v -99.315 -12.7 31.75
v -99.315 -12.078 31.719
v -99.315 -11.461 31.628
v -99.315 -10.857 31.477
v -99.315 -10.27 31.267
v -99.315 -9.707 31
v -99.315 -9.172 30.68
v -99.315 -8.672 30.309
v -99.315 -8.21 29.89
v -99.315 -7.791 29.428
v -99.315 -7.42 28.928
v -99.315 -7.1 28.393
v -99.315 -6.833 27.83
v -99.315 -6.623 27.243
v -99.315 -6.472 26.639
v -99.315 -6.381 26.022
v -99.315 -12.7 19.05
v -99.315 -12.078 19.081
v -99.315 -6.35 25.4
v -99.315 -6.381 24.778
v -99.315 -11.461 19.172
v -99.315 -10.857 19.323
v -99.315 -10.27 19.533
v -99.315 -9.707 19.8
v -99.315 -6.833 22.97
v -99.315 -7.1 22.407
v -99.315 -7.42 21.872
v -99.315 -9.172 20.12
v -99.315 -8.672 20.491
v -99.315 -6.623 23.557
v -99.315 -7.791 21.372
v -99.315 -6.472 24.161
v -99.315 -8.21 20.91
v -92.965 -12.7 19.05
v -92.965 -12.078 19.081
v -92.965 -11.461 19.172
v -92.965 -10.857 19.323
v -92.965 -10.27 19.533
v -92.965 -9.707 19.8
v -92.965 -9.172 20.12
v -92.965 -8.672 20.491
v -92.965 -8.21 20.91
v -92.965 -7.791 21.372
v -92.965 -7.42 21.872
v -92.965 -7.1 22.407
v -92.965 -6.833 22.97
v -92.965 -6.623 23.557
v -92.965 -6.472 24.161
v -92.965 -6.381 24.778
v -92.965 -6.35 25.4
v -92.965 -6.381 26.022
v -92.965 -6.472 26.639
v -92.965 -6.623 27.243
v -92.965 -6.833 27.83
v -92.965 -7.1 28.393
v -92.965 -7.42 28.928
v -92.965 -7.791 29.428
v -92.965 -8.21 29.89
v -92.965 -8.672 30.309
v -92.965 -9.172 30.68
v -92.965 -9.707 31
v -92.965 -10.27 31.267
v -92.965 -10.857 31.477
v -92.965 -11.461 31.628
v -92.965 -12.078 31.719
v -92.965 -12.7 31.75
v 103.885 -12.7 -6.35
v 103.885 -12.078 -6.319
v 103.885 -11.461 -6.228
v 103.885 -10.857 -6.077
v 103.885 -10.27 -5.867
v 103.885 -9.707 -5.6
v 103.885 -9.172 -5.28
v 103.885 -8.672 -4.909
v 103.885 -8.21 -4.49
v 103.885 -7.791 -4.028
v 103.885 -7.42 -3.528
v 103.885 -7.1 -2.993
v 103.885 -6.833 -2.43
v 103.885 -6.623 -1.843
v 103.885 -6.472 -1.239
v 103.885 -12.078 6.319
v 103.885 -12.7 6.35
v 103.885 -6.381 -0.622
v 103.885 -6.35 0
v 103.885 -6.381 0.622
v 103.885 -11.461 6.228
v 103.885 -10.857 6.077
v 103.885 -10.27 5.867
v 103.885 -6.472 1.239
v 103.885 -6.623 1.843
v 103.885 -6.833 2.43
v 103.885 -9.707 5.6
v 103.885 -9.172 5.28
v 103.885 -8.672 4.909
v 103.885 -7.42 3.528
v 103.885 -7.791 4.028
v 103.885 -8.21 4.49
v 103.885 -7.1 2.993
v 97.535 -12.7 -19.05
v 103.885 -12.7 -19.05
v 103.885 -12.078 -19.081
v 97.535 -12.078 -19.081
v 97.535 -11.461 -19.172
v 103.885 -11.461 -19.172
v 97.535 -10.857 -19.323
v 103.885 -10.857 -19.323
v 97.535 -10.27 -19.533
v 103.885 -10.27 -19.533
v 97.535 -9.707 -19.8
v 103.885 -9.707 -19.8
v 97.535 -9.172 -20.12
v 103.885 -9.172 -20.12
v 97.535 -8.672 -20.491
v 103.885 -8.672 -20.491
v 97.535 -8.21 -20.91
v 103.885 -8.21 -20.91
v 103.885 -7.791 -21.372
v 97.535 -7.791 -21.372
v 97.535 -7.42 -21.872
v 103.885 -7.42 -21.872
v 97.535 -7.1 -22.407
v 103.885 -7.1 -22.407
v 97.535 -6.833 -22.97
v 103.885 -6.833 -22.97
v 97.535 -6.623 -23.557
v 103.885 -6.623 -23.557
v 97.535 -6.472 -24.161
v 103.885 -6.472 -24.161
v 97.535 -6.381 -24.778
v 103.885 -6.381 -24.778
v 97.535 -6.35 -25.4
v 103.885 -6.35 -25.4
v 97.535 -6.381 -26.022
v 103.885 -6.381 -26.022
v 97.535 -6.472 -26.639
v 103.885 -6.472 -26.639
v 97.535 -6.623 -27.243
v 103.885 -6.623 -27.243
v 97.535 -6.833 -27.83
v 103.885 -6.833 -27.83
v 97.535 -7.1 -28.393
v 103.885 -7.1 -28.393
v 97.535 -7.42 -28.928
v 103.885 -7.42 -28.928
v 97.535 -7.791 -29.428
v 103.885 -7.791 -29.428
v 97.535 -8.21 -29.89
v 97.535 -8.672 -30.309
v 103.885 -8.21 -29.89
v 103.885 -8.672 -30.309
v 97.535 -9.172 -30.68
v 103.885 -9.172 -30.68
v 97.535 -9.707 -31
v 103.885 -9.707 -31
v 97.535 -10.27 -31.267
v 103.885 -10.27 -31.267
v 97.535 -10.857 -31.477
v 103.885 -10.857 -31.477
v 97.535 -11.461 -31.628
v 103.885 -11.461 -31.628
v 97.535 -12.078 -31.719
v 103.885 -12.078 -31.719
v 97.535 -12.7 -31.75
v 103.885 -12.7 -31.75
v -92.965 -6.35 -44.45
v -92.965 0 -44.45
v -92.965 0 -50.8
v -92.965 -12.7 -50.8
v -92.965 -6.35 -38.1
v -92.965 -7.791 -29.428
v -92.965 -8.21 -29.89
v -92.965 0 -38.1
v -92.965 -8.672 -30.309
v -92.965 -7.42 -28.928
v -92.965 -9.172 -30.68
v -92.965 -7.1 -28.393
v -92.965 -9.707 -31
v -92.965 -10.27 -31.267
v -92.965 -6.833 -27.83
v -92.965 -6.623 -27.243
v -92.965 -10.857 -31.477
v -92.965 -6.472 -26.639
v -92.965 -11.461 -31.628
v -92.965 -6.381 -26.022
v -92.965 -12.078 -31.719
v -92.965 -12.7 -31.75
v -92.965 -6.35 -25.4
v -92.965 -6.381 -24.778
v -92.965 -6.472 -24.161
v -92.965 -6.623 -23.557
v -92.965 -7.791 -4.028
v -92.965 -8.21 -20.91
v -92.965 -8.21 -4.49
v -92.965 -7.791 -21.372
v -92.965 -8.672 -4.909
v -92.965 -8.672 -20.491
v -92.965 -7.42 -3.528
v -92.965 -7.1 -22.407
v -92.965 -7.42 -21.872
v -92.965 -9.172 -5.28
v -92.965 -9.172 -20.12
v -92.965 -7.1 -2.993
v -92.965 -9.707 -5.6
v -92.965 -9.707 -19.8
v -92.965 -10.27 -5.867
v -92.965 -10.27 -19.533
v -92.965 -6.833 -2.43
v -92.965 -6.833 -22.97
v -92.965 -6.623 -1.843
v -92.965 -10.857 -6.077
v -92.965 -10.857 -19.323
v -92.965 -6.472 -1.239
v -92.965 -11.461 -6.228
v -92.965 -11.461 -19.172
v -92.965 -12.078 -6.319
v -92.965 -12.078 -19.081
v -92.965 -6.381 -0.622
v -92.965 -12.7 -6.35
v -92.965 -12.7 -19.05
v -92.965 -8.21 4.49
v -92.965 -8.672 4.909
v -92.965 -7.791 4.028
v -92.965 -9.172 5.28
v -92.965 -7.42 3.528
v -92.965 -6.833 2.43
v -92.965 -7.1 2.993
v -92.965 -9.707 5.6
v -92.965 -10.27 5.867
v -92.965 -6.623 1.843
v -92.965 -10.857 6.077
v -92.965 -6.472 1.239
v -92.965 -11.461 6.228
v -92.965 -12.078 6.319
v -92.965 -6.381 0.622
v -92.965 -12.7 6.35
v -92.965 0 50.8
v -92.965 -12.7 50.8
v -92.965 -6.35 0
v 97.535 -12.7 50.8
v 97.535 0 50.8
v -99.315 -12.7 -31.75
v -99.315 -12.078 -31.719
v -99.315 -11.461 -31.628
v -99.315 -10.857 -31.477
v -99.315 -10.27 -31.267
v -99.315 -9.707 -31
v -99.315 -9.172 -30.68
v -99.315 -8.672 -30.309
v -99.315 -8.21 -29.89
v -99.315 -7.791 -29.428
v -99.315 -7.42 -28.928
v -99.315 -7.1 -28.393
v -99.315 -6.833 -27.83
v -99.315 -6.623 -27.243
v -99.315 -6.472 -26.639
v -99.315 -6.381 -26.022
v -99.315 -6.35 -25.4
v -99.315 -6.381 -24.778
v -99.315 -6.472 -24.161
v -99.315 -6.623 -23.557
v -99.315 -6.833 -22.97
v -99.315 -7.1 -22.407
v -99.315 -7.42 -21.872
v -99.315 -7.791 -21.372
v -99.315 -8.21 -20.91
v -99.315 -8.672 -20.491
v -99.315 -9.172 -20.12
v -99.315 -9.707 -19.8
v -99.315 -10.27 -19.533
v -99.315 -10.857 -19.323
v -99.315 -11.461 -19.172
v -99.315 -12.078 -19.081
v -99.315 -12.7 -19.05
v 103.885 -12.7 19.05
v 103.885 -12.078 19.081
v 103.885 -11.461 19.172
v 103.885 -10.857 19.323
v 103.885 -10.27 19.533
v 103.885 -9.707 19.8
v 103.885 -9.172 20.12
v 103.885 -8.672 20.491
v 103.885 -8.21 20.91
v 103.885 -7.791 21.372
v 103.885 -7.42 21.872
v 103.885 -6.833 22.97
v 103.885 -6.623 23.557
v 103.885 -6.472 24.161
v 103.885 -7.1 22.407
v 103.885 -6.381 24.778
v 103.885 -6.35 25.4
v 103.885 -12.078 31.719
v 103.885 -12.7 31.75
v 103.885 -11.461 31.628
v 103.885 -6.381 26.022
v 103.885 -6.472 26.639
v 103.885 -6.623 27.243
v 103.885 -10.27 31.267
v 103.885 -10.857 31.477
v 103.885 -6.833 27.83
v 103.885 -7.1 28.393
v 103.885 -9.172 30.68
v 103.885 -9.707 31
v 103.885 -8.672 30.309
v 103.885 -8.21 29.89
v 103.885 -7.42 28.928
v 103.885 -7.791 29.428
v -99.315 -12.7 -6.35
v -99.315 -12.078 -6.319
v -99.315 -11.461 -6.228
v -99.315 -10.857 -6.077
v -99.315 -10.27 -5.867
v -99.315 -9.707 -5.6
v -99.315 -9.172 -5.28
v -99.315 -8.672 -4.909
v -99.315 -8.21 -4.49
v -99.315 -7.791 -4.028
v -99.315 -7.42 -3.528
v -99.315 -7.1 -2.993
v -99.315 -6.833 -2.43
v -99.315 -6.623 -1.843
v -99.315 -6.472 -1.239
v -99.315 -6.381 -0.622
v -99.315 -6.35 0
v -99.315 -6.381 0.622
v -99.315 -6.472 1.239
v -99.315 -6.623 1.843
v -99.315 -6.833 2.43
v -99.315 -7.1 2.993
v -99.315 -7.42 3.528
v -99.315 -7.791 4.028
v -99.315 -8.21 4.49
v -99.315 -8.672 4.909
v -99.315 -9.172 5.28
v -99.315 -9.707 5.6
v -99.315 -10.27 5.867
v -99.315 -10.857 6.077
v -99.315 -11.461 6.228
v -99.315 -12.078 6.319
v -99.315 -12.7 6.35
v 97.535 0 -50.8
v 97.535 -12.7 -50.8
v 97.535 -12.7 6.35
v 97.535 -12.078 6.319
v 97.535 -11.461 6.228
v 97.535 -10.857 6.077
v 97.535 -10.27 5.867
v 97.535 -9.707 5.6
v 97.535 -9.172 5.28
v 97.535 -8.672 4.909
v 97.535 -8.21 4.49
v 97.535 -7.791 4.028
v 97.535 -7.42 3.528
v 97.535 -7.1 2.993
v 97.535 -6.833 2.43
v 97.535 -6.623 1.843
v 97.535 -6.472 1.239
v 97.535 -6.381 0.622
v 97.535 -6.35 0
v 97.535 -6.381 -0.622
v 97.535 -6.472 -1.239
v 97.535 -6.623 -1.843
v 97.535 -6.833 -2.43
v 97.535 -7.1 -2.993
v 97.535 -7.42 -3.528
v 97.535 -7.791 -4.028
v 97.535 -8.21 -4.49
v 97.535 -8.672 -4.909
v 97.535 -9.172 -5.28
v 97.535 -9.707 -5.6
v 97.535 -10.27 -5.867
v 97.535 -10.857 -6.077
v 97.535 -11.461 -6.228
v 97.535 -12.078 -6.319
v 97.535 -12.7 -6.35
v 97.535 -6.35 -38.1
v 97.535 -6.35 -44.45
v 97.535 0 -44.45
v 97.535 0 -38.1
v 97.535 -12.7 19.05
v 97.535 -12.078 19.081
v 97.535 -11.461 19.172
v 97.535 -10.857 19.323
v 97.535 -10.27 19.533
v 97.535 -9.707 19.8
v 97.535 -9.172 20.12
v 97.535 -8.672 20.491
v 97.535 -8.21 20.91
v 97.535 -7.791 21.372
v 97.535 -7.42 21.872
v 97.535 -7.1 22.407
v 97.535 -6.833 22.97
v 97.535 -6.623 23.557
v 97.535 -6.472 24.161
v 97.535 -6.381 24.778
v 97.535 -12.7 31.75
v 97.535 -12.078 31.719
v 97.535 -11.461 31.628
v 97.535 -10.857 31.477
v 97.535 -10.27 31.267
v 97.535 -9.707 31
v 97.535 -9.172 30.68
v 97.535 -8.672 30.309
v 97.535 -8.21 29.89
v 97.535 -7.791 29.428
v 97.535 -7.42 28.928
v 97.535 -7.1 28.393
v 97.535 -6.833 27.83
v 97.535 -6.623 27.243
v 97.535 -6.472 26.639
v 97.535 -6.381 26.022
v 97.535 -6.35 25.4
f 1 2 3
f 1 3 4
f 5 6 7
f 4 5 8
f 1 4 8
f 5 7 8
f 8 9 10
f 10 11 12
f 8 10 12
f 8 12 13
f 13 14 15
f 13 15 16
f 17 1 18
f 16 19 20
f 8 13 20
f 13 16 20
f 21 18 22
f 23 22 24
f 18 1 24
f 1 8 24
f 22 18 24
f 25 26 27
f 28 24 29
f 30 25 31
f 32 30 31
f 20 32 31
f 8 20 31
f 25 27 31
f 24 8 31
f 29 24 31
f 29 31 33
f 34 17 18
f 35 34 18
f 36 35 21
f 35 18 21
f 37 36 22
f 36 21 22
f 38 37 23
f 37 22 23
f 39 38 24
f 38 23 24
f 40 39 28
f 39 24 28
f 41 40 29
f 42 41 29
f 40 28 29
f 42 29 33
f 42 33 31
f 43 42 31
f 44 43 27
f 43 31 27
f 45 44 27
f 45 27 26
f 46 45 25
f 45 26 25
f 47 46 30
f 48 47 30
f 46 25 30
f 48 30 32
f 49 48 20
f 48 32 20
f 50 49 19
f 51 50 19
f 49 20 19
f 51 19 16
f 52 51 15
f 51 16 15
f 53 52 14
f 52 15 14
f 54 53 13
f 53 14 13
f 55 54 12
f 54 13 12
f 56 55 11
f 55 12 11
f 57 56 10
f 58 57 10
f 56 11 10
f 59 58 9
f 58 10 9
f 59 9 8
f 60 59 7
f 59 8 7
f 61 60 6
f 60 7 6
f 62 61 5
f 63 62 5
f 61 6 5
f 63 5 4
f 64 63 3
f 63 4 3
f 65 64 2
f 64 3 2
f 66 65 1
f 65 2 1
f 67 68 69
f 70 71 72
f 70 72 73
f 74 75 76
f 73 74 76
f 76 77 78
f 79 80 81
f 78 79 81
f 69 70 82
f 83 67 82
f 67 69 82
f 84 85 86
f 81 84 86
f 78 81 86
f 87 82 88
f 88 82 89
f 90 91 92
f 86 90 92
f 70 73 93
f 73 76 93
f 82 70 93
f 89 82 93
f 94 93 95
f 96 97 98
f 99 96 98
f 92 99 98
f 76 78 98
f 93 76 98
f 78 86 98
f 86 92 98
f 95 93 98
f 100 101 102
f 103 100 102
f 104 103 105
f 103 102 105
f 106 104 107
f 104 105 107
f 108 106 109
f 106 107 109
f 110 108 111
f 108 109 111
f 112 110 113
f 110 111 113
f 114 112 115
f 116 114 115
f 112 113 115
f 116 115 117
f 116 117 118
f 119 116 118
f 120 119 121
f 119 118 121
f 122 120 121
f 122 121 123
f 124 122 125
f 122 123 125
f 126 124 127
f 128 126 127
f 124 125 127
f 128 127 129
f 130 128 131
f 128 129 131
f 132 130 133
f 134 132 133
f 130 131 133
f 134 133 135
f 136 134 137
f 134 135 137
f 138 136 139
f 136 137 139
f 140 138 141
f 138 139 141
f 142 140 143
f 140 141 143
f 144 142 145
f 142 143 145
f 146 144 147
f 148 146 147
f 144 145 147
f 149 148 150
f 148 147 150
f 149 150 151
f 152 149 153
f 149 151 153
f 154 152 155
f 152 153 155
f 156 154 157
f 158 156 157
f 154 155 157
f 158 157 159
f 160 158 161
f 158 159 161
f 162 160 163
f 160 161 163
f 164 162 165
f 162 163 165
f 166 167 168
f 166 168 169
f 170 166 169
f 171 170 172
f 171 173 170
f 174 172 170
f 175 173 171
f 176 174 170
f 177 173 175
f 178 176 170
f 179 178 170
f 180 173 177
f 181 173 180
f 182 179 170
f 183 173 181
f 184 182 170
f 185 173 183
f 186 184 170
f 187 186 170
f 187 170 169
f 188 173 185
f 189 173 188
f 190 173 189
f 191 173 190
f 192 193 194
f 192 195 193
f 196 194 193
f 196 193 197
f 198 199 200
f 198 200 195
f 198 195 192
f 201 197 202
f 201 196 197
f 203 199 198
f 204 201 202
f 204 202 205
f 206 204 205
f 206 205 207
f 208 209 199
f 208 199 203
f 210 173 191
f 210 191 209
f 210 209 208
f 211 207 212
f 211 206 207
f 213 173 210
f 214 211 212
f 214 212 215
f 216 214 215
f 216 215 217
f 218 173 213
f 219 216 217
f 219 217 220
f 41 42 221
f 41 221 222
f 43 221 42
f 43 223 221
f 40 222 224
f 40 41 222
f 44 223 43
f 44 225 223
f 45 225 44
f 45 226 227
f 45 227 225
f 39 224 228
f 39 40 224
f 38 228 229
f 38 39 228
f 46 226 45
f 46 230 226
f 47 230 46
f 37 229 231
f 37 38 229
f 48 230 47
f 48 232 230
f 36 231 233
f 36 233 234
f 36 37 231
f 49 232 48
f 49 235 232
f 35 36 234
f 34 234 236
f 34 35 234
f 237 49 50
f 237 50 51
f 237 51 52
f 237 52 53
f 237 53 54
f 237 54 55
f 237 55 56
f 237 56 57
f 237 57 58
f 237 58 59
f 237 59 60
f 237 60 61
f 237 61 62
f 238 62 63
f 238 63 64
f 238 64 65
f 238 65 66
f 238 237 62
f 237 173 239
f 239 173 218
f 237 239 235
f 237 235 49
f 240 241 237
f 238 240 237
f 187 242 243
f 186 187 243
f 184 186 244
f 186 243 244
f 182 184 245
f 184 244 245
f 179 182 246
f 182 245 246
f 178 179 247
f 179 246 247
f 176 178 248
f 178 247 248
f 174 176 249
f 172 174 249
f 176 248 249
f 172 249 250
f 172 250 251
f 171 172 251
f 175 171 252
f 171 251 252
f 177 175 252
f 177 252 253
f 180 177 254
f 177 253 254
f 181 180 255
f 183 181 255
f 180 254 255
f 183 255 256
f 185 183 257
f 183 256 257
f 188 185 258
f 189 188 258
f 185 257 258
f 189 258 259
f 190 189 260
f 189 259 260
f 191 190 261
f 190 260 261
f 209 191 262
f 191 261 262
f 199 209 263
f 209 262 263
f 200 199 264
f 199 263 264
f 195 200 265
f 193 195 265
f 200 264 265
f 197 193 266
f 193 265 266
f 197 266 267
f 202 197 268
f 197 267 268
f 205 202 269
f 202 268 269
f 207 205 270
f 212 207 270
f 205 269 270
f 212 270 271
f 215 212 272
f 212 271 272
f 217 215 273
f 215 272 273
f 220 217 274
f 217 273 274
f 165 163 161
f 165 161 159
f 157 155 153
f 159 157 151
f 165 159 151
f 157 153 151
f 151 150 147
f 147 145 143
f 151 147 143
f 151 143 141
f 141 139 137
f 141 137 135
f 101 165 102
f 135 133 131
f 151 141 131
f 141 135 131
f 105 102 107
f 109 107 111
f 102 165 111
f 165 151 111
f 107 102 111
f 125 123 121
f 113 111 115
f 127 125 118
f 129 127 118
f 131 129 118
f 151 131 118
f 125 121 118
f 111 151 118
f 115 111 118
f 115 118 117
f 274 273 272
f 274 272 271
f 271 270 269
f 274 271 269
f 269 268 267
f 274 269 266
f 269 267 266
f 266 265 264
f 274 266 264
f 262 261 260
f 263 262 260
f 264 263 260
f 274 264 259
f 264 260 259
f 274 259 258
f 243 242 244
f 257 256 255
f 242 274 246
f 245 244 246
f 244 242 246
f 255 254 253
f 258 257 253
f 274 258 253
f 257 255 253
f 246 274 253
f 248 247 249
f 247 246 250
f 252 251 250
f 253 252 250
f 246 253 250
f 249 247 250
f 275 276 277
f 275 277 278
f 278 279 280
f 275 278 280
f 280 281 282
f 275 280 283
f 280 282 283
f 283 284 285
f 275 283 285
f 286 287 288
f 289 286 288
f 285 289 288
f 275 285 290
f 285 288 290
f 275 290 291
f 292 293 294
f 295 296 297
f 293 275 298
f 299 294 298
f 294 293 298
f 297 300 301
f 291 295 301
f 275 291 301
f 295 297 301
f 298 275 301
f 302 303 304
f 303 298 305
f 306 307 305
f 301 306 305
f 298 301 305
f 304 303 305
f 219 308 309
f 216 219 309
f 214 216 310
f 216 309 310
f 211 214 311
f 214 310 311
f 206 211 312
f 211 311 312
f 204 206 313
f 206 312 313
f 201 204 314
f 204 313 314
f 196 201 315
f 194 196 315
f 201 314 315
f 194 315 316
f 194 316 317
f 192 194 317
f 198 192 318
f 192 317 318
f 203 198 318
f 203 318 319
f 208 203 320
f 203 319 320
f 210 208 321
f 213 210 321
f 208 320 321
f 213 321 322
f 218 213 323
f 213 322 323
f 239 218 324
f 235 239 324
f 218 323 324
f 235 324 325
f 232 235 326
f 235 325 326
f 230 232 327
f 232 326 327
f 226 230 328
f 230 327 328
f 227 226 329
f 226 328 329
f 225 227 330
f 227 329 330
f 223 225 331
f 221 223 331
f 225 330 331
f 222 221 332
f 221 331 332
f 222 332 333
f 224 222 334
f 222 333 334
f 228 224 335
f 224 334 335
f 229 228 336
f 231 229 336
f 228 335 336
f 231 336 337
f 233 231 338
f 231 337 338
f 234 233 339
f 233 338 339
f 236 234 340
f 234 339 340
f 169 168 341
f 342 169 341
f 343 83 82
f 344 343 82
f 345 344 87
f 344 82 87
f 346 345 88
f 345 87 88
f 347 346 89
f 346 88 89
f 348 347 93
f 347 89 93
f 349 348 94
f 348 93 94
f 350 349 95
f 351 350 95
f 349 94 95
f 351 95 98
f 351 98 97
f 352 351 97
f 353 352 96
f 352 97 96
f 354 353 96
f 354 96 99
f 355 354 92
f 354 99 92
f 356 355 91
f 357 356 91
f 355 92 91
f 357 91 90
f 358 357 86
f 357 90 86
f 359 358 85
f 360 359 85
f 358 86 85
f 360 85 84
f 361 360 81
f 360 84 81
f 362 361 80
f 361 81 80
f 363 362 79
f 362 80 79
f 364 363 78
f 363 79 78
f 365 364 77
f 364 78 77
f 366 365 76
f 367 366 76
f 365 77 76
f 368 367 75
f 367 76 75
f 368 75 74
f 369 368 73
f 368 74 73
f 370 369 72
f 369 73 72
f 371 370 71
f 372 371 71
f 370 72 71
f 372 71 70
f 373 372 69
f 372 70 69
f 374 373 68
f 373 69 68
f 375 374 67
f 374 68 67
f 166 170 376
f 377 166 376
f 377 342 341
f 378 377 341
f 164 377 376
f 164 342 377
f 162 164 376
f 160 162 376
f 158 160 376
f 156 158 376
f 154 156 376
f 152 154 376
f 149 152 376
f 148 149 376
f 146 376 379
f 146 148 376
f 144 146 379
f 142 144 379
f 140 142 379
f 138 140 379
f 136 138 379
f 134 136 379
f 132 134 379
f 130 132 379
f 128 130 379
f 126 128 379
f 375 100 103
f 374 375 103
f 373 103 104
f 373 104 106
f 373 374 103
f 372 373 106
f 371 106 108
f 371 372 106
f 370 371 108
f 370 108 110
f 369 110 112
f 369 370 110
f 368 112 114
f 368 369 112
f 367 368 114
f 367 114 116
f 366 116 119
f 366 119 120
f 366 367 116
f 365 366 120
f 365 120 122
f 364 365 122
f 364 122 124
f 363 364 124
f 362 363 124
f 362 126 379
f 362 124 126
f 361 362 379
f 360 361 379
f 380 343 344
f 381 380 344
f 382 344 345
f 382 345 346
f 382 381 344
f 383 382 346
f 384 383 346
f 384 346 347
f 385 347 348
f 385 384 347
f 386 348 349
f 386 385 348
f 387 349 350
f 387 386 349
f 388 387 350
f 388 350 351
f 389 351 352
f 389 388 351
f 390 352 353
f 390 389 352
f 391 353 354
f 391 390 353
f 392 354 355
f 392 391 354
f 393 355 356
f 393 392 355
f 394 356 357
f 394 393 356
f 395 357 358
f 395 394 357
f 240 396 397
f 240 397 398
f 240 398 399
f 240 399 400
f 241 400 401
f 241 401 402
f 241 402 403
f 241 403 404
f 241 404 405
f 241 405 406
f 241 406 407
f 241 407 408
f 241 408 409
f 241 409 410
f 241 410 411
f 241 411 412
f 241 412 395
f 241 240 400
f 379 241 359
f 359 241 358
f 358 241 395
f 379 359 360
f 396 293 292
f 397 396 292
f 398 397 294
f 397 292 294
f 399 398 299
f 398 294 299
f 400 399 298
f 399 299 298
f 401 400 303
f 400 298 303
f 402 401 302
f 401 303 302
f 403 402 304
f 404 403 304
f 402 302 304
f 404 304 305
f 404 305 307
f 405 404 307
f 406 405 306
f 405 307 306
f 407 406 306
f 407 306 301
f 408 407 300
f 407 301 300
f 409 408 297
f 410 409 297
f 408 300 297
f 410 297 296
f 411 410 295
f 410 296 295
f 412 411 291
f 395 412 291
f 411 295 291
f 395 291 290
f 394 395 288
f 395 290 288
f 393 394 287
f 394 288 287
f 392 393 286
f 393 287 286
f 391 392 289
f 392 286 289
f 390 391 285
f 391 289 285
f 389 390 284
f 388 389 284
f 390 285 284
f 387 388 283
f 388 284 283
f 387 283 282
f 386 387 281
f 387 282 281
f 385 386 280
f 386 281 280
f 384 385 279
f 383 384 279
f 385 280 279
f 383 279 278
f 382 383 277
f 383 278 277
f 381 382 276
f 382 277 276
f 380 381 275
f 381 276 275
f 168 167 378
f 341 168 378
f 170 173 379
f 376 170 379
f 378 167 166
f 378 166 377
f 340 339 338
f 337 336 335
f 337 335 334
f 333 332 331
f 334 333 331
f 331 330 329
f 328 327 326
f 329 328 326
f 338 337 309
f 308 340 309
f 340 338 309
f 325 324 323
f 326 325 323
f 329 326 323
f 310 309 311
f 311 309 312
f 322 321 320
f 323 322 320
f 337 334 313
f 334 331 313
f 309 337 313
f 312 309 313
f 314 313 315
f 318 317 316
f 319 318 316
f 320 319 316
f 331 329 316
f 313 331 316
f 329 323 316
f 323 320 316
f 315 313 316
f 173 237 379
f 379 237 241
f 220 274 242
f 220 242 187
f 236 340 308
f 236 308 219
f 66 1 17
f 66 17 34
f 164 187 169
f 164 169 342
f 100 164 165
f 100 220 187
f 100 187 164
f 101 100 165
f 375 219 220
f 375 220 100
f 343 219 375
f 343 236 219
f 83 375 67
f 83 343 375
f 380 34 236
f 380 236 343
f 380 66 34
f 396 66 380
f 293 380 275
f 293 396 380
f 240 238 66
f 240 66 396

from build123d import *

# Parameters (mm, degrees)
F0_W     = 190.5
F0_H     = 88.9
F0_H_2   = 6.35
F1_DEPTH = 12.7
F2_DEPTH = 6.35
F4_DEPTH = 6.35
F6_DEPTH = 6.35


with BuildPart() as f1:
    # F0 (on Front) → F1 (new body)
    with BuildSketch(Plane.XZ):
        Polygon((103.884577, -50.8), (103.884577, 50.8), (97.534577, 50.8), (97.534577, -38.1), (97.534577, -44.45), (97.534577, -50.8), align=None)
        with Locations((2.284577, 6.35)):
            Rectangle(F0_W, F0_H)
        Polygon((-92.965423, -38.1), (-92.965423, 50.8), (-99.315423, 50.8), (-99.315423, -50.8), (-92.965423, -50.8), (-92.965423, -44.45), align=None)
        with Locations((2.284577, -47.625)):
            Rectangle(F0_W, F0_H_2)
        with Locations((2.284577, -41.275)):
            Rectangle(F0_W, F0_H_2)
    extrude(amount=F1_DEPTH)

    # F0 (on Front) → F2 (cut)
    with BuildSketch(Plane.XZ):
        with Locations((2.284577, -41.275)):
            Rectangle(F0_W, F0_H_2)
    extrude(amount=F2_DEPTH, mode=Mode.SUBTRACT)

    # F3 (on face) → F4 (cut)
    with BuildSketch(Plane(origin=(-99.315423, 0, 0), x_dir=(0, -1, 0), z_dir=(-1, 0, 0))):
        with BuildLine():
            ThreePointArc((12.7, 19.05), (6.35, 25.4), (12.7, 31.75))
            Line((12.7, 31.75), (12.7, 50.8))
            Line((12.7, 50.8), (0, 50.8))
            Line((0, 50.8), (0, -50.8))
            Line((0, -50.8), (12.7, -50.8))
            Line((12.7, -50.8), (12.7, -31.75))
            ThreePointArc((12.7, -31.75), (6.35, -25.4), (12.7, -19.05))
            Line((12.7, -19.05), (12.7, -6.35))
            ThreePointArc((12.7, -6.35), (6.35, 0), (12.7, 6.35))
            Line((12.7, 6.35), (12.7, 19.05))
        make_face()
    extrude(amount=-F4_DEPTH, mode=Mode.SUBTRACT)

    # F5 (on face) → F6 (cut)
    with BuildSketch(Plane.YZ.offset(103.884577)):
        with BuildLine():
            ThreePointArc((-12.7, 31.75), (-6.35, 25.4), (-12.7, 19.05))
            Line((-12.7, 19.05), (-12.7, 6.35))
            ThreePointArc((-12.7, 6.35), (-6.35, 0), (-12.7, -6.35))
            Line((-12.7, -6.35), (-12.7, -19.05))
            ThreePointArc((-12.7, -19.05), (-6.35, -25.4), (-12.7, -31.75))
            Line((-12.7, -31.75), (-12.7, -50.8))
            Line((-12.7, -50.8), (0, -50.8))
            Line((0, -50.8), (0, 50.8))
            Line((0, 50.8), (-12.7, 50.8))
            Line((-12.7, 50.8), (-12.7, 31.75))
        make_face()
    extrude(amount=-F6_DEPTH, mode=Mode.SUBTRACT)


solid = f1.part
